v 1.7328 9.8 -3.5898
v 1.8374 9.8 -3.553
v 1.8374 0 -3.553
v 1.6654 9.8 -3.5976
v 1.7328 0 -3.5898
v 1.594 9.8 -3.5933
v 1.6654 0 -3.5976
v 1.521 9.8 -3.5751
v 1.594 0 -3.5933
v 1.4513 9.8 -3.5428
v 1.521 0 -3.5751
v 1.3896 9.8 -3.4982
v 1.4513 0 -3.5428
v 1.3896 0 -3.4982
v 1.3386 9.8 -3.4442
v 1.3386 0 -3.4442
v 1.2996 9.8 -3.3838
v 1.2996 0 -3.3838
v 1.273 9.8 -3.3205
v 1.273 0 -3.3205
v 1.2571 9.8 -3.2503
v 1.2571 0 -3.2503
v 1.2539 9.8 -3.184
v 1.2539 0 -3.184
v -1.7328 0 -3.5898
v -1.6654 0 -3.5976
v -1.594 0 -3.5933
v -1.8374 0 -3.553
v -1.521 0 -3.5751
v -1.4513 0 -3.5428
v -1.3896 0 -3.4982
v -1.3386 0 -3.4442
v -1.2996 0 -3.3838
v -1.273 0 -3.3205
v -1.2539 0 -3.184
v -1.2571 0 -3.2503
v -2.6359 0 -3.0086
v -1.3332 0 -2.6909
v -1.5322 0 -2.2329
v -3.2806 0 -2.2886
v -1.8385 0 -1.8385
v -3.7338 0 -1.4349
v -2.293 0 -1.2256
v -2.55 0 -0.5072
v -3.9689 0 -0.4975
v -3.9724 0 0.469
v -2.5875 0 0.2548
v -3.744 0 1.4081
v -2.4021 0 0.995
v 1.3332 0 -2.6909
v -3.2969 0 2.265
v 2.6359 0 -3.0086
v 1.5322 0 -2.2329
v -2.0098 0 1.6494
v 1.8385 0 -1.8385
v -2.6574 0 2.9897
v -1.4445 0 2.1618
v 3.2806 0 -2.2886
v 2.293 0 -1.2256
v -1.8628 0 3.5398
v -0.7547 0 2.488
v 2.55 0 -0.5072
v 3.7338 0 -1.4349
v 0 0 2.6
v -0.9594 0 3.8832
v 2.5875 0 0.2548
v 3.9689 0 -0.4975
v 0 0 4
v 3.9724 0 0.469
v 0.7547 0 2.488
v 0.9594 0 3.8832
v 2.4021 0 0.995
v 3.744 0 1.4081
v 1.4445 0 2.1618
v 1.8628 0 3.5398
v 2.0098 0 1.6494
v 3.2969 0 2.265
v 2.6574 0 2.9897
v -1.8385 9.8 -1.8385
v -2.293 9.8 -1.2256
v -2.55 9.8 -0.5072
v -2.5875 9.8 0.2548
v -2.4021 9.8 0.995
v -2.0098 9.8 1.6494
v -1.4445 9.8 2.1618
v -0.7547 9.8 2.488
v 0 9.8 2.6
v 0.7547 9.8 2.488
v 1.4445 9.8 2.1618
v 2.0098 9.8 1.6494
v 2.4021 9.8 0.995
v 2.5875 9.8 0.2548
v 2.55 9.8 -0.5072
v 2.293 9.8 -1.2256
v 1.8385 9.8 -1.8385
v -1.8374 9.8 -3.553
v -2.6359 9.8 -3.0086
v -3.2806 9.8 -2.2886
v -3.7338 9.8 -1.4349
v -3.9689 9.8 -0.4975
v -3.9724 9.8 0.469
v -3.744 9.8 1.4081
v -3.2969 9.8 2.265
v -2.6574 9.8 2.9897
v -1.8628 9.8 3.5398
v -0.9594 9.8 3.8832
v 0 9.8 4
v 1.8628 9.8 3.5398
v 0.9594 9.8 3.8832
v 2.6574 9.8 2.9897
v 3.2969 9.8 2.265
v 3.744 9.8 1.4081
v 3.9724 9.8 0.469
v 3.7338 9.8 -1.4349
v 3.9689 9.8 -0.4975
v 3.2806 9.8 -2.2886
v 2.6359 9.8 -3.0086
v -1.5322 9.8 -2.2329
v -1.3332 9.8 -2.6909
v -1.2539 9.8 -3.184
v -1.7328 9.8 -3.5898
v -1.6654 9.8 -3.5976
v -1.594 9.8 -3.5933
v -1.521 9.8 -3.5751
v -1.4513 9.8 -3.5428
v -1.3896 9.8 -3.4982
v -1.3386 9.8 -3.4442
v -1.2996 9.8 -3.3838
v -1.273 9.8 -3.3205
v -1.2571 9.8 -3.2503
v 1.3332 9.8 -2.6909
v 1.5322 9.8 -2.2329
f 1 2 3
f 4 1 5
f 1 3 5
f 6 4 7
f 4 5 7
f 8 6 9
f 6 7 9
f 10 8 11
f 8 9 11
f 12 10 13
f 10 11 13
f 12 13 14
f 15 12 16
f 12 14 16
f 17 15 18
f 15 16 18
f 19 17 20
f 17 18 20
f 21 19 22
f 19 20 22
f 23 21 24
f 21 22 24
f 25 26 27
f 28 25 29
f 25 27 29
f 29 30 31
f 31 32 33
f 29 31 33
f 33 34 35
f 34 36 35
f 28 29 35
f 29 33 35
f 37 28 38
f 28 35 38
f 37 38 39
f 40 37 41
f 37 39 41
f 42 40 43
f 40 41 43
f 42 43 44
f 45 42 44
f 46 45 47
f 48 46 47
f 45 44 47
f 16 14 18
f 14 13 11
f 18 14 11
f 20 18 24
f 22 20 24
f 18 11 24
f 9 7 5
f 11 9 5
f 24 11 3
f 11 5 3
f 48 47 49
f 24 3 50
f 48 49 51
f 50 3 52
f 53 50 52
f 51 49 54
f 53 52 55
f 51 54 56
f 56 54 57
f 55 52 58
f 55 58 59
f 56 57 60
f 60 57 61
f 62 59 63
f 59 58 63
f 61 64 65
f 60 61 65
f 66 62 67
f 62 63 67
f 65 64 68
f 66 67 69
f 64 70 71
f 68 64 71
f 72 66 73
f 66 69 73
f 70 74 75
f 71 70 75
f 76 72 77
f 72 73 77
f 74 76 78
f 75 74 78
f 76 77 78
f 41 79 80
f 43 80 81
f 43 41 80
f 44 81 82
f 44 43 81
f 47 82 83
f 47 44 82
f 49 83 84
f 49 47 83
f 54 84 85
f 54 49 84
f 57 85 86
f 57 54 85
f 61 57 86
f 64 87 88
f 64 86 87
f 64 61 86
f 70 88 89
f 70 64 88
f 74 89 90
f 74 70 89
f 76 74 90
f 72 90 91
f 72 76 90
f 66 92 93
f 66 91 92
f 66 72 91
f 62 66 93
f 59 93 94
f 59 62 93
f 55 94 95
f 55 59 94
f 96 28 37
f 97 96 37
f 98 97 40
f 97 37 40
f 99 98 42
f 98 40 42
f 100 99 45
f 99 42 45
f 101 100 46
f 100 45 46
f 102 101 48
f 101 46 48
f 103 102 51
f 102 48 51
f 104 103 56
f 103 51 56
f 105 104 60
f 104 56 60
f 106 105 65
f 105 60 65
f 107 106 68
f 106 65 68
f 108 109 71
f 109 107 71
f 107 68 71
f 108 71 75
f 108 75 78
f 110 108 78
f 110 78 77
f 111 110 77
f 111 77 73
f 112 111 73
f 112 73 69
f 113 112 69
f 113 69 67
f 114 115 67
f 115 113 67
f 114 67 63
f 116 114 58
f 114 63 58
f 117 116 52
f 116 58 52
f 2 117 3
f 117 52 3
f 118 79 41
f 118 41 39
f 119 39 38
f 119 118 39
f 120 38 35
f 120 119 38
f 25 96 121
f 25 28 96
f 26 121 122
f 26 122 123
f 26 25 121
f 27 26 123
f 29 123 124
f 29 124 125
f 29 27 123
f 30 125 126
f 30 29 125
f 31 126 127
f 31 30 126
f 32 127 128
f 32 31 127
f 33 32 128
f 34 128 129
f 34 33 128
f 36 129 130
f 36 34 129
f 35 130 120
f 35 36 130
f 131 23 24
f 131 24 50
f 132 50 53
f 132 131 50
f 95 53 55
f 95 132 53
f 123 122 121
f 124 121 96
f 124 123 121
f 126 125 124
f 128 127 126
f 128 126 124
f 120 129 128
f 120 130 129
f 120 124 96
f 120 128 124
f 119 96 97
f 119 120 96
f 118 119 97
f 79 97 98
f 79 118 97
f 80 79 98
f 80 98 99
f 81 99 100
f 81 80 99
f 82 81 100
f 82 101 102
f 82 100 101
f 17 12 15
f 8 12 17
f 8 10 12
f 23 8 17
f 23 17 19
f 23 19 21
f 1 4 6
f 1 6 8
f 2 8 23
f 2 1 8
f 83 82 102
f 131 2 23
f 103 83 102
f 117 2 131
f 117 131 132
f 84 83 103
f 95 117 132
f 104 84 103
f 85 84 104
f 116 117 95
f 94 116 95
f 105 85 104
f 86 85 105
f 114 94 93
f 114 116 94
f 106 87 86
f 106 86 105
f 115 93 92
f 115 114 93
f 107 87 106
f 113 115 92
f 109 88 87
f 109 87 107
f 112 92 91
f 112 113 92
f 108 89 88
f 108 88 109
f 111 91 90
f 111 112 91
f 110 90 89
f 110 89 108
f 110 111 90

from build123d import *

# Parameters (mm, degrees)
SKETCH1_R           = 4
SKETCH1_R_2         = 2.6
BOSS_EXTRUDE1_DEPTH = 9.8
CUT_EXTRUDE1_DEPTH  = 12.315476128
FILLET1_R           = 0.4


with BuildPart() as part:
    # Sketch1 → Boss-Extrude1 (new body)
    with BuildSketch(Plane(origin=(0, 0, 0), x_dir=(1, 0, 0), z_dir=(0, 1, 0))):
        with Locations(Location((0, 0, 0), (0, 0, 270))):
            Circle(SKETCH1_R)
        with Locations(Location((0, 0, 0), (0, 0, 270))):
            Circle(SKETCH1_R_2, mode=Mode.SUBTRACT)
    extrude(amount=BOSS_EXTRUDE1_DEPTH)

    # Sketch2 → Cut-Extrude1 (cut, through all)
    with BuildSketch(Plane(origin=(0, 9.8, 0), x_dir=(1, 0, 0), z_dir=(0, 1, 0))):
        with BuildLine():
            ThreePointArc((-1.838477631, 1.838477631), (-1.320191838, 2.737476443), (-1.322144063, 3.775173516))
            ThreePointArc((-1.322144063, 3.775173516), (0, 4), (1.322144063, 3.775173516))
            ThreePointArc((1.322144063, 3.775173516), (1.320191838, 2.737476443), (1.838477631, 1.838477631))
            ThreePointArc((1.838477631, 1.838477631), (0, 2.6), (-1.838477631, 1.838477631))
        make_face()
    extrude(amount=-CUT_EXTRUDE1_DEPTH, mode=Mode.SUBTRACT)

    # Fillet1
    fillet1_edges = [part.edges().sort_by_distance(p)[0] for p in [
        (-1.322144063, 4.9, -3.775173516),
        (1.322144063, 4.9, -3.775173516),
    ]]
    fillet(fillet1_edges, radius=FILLET1_R)


solid = part.part
